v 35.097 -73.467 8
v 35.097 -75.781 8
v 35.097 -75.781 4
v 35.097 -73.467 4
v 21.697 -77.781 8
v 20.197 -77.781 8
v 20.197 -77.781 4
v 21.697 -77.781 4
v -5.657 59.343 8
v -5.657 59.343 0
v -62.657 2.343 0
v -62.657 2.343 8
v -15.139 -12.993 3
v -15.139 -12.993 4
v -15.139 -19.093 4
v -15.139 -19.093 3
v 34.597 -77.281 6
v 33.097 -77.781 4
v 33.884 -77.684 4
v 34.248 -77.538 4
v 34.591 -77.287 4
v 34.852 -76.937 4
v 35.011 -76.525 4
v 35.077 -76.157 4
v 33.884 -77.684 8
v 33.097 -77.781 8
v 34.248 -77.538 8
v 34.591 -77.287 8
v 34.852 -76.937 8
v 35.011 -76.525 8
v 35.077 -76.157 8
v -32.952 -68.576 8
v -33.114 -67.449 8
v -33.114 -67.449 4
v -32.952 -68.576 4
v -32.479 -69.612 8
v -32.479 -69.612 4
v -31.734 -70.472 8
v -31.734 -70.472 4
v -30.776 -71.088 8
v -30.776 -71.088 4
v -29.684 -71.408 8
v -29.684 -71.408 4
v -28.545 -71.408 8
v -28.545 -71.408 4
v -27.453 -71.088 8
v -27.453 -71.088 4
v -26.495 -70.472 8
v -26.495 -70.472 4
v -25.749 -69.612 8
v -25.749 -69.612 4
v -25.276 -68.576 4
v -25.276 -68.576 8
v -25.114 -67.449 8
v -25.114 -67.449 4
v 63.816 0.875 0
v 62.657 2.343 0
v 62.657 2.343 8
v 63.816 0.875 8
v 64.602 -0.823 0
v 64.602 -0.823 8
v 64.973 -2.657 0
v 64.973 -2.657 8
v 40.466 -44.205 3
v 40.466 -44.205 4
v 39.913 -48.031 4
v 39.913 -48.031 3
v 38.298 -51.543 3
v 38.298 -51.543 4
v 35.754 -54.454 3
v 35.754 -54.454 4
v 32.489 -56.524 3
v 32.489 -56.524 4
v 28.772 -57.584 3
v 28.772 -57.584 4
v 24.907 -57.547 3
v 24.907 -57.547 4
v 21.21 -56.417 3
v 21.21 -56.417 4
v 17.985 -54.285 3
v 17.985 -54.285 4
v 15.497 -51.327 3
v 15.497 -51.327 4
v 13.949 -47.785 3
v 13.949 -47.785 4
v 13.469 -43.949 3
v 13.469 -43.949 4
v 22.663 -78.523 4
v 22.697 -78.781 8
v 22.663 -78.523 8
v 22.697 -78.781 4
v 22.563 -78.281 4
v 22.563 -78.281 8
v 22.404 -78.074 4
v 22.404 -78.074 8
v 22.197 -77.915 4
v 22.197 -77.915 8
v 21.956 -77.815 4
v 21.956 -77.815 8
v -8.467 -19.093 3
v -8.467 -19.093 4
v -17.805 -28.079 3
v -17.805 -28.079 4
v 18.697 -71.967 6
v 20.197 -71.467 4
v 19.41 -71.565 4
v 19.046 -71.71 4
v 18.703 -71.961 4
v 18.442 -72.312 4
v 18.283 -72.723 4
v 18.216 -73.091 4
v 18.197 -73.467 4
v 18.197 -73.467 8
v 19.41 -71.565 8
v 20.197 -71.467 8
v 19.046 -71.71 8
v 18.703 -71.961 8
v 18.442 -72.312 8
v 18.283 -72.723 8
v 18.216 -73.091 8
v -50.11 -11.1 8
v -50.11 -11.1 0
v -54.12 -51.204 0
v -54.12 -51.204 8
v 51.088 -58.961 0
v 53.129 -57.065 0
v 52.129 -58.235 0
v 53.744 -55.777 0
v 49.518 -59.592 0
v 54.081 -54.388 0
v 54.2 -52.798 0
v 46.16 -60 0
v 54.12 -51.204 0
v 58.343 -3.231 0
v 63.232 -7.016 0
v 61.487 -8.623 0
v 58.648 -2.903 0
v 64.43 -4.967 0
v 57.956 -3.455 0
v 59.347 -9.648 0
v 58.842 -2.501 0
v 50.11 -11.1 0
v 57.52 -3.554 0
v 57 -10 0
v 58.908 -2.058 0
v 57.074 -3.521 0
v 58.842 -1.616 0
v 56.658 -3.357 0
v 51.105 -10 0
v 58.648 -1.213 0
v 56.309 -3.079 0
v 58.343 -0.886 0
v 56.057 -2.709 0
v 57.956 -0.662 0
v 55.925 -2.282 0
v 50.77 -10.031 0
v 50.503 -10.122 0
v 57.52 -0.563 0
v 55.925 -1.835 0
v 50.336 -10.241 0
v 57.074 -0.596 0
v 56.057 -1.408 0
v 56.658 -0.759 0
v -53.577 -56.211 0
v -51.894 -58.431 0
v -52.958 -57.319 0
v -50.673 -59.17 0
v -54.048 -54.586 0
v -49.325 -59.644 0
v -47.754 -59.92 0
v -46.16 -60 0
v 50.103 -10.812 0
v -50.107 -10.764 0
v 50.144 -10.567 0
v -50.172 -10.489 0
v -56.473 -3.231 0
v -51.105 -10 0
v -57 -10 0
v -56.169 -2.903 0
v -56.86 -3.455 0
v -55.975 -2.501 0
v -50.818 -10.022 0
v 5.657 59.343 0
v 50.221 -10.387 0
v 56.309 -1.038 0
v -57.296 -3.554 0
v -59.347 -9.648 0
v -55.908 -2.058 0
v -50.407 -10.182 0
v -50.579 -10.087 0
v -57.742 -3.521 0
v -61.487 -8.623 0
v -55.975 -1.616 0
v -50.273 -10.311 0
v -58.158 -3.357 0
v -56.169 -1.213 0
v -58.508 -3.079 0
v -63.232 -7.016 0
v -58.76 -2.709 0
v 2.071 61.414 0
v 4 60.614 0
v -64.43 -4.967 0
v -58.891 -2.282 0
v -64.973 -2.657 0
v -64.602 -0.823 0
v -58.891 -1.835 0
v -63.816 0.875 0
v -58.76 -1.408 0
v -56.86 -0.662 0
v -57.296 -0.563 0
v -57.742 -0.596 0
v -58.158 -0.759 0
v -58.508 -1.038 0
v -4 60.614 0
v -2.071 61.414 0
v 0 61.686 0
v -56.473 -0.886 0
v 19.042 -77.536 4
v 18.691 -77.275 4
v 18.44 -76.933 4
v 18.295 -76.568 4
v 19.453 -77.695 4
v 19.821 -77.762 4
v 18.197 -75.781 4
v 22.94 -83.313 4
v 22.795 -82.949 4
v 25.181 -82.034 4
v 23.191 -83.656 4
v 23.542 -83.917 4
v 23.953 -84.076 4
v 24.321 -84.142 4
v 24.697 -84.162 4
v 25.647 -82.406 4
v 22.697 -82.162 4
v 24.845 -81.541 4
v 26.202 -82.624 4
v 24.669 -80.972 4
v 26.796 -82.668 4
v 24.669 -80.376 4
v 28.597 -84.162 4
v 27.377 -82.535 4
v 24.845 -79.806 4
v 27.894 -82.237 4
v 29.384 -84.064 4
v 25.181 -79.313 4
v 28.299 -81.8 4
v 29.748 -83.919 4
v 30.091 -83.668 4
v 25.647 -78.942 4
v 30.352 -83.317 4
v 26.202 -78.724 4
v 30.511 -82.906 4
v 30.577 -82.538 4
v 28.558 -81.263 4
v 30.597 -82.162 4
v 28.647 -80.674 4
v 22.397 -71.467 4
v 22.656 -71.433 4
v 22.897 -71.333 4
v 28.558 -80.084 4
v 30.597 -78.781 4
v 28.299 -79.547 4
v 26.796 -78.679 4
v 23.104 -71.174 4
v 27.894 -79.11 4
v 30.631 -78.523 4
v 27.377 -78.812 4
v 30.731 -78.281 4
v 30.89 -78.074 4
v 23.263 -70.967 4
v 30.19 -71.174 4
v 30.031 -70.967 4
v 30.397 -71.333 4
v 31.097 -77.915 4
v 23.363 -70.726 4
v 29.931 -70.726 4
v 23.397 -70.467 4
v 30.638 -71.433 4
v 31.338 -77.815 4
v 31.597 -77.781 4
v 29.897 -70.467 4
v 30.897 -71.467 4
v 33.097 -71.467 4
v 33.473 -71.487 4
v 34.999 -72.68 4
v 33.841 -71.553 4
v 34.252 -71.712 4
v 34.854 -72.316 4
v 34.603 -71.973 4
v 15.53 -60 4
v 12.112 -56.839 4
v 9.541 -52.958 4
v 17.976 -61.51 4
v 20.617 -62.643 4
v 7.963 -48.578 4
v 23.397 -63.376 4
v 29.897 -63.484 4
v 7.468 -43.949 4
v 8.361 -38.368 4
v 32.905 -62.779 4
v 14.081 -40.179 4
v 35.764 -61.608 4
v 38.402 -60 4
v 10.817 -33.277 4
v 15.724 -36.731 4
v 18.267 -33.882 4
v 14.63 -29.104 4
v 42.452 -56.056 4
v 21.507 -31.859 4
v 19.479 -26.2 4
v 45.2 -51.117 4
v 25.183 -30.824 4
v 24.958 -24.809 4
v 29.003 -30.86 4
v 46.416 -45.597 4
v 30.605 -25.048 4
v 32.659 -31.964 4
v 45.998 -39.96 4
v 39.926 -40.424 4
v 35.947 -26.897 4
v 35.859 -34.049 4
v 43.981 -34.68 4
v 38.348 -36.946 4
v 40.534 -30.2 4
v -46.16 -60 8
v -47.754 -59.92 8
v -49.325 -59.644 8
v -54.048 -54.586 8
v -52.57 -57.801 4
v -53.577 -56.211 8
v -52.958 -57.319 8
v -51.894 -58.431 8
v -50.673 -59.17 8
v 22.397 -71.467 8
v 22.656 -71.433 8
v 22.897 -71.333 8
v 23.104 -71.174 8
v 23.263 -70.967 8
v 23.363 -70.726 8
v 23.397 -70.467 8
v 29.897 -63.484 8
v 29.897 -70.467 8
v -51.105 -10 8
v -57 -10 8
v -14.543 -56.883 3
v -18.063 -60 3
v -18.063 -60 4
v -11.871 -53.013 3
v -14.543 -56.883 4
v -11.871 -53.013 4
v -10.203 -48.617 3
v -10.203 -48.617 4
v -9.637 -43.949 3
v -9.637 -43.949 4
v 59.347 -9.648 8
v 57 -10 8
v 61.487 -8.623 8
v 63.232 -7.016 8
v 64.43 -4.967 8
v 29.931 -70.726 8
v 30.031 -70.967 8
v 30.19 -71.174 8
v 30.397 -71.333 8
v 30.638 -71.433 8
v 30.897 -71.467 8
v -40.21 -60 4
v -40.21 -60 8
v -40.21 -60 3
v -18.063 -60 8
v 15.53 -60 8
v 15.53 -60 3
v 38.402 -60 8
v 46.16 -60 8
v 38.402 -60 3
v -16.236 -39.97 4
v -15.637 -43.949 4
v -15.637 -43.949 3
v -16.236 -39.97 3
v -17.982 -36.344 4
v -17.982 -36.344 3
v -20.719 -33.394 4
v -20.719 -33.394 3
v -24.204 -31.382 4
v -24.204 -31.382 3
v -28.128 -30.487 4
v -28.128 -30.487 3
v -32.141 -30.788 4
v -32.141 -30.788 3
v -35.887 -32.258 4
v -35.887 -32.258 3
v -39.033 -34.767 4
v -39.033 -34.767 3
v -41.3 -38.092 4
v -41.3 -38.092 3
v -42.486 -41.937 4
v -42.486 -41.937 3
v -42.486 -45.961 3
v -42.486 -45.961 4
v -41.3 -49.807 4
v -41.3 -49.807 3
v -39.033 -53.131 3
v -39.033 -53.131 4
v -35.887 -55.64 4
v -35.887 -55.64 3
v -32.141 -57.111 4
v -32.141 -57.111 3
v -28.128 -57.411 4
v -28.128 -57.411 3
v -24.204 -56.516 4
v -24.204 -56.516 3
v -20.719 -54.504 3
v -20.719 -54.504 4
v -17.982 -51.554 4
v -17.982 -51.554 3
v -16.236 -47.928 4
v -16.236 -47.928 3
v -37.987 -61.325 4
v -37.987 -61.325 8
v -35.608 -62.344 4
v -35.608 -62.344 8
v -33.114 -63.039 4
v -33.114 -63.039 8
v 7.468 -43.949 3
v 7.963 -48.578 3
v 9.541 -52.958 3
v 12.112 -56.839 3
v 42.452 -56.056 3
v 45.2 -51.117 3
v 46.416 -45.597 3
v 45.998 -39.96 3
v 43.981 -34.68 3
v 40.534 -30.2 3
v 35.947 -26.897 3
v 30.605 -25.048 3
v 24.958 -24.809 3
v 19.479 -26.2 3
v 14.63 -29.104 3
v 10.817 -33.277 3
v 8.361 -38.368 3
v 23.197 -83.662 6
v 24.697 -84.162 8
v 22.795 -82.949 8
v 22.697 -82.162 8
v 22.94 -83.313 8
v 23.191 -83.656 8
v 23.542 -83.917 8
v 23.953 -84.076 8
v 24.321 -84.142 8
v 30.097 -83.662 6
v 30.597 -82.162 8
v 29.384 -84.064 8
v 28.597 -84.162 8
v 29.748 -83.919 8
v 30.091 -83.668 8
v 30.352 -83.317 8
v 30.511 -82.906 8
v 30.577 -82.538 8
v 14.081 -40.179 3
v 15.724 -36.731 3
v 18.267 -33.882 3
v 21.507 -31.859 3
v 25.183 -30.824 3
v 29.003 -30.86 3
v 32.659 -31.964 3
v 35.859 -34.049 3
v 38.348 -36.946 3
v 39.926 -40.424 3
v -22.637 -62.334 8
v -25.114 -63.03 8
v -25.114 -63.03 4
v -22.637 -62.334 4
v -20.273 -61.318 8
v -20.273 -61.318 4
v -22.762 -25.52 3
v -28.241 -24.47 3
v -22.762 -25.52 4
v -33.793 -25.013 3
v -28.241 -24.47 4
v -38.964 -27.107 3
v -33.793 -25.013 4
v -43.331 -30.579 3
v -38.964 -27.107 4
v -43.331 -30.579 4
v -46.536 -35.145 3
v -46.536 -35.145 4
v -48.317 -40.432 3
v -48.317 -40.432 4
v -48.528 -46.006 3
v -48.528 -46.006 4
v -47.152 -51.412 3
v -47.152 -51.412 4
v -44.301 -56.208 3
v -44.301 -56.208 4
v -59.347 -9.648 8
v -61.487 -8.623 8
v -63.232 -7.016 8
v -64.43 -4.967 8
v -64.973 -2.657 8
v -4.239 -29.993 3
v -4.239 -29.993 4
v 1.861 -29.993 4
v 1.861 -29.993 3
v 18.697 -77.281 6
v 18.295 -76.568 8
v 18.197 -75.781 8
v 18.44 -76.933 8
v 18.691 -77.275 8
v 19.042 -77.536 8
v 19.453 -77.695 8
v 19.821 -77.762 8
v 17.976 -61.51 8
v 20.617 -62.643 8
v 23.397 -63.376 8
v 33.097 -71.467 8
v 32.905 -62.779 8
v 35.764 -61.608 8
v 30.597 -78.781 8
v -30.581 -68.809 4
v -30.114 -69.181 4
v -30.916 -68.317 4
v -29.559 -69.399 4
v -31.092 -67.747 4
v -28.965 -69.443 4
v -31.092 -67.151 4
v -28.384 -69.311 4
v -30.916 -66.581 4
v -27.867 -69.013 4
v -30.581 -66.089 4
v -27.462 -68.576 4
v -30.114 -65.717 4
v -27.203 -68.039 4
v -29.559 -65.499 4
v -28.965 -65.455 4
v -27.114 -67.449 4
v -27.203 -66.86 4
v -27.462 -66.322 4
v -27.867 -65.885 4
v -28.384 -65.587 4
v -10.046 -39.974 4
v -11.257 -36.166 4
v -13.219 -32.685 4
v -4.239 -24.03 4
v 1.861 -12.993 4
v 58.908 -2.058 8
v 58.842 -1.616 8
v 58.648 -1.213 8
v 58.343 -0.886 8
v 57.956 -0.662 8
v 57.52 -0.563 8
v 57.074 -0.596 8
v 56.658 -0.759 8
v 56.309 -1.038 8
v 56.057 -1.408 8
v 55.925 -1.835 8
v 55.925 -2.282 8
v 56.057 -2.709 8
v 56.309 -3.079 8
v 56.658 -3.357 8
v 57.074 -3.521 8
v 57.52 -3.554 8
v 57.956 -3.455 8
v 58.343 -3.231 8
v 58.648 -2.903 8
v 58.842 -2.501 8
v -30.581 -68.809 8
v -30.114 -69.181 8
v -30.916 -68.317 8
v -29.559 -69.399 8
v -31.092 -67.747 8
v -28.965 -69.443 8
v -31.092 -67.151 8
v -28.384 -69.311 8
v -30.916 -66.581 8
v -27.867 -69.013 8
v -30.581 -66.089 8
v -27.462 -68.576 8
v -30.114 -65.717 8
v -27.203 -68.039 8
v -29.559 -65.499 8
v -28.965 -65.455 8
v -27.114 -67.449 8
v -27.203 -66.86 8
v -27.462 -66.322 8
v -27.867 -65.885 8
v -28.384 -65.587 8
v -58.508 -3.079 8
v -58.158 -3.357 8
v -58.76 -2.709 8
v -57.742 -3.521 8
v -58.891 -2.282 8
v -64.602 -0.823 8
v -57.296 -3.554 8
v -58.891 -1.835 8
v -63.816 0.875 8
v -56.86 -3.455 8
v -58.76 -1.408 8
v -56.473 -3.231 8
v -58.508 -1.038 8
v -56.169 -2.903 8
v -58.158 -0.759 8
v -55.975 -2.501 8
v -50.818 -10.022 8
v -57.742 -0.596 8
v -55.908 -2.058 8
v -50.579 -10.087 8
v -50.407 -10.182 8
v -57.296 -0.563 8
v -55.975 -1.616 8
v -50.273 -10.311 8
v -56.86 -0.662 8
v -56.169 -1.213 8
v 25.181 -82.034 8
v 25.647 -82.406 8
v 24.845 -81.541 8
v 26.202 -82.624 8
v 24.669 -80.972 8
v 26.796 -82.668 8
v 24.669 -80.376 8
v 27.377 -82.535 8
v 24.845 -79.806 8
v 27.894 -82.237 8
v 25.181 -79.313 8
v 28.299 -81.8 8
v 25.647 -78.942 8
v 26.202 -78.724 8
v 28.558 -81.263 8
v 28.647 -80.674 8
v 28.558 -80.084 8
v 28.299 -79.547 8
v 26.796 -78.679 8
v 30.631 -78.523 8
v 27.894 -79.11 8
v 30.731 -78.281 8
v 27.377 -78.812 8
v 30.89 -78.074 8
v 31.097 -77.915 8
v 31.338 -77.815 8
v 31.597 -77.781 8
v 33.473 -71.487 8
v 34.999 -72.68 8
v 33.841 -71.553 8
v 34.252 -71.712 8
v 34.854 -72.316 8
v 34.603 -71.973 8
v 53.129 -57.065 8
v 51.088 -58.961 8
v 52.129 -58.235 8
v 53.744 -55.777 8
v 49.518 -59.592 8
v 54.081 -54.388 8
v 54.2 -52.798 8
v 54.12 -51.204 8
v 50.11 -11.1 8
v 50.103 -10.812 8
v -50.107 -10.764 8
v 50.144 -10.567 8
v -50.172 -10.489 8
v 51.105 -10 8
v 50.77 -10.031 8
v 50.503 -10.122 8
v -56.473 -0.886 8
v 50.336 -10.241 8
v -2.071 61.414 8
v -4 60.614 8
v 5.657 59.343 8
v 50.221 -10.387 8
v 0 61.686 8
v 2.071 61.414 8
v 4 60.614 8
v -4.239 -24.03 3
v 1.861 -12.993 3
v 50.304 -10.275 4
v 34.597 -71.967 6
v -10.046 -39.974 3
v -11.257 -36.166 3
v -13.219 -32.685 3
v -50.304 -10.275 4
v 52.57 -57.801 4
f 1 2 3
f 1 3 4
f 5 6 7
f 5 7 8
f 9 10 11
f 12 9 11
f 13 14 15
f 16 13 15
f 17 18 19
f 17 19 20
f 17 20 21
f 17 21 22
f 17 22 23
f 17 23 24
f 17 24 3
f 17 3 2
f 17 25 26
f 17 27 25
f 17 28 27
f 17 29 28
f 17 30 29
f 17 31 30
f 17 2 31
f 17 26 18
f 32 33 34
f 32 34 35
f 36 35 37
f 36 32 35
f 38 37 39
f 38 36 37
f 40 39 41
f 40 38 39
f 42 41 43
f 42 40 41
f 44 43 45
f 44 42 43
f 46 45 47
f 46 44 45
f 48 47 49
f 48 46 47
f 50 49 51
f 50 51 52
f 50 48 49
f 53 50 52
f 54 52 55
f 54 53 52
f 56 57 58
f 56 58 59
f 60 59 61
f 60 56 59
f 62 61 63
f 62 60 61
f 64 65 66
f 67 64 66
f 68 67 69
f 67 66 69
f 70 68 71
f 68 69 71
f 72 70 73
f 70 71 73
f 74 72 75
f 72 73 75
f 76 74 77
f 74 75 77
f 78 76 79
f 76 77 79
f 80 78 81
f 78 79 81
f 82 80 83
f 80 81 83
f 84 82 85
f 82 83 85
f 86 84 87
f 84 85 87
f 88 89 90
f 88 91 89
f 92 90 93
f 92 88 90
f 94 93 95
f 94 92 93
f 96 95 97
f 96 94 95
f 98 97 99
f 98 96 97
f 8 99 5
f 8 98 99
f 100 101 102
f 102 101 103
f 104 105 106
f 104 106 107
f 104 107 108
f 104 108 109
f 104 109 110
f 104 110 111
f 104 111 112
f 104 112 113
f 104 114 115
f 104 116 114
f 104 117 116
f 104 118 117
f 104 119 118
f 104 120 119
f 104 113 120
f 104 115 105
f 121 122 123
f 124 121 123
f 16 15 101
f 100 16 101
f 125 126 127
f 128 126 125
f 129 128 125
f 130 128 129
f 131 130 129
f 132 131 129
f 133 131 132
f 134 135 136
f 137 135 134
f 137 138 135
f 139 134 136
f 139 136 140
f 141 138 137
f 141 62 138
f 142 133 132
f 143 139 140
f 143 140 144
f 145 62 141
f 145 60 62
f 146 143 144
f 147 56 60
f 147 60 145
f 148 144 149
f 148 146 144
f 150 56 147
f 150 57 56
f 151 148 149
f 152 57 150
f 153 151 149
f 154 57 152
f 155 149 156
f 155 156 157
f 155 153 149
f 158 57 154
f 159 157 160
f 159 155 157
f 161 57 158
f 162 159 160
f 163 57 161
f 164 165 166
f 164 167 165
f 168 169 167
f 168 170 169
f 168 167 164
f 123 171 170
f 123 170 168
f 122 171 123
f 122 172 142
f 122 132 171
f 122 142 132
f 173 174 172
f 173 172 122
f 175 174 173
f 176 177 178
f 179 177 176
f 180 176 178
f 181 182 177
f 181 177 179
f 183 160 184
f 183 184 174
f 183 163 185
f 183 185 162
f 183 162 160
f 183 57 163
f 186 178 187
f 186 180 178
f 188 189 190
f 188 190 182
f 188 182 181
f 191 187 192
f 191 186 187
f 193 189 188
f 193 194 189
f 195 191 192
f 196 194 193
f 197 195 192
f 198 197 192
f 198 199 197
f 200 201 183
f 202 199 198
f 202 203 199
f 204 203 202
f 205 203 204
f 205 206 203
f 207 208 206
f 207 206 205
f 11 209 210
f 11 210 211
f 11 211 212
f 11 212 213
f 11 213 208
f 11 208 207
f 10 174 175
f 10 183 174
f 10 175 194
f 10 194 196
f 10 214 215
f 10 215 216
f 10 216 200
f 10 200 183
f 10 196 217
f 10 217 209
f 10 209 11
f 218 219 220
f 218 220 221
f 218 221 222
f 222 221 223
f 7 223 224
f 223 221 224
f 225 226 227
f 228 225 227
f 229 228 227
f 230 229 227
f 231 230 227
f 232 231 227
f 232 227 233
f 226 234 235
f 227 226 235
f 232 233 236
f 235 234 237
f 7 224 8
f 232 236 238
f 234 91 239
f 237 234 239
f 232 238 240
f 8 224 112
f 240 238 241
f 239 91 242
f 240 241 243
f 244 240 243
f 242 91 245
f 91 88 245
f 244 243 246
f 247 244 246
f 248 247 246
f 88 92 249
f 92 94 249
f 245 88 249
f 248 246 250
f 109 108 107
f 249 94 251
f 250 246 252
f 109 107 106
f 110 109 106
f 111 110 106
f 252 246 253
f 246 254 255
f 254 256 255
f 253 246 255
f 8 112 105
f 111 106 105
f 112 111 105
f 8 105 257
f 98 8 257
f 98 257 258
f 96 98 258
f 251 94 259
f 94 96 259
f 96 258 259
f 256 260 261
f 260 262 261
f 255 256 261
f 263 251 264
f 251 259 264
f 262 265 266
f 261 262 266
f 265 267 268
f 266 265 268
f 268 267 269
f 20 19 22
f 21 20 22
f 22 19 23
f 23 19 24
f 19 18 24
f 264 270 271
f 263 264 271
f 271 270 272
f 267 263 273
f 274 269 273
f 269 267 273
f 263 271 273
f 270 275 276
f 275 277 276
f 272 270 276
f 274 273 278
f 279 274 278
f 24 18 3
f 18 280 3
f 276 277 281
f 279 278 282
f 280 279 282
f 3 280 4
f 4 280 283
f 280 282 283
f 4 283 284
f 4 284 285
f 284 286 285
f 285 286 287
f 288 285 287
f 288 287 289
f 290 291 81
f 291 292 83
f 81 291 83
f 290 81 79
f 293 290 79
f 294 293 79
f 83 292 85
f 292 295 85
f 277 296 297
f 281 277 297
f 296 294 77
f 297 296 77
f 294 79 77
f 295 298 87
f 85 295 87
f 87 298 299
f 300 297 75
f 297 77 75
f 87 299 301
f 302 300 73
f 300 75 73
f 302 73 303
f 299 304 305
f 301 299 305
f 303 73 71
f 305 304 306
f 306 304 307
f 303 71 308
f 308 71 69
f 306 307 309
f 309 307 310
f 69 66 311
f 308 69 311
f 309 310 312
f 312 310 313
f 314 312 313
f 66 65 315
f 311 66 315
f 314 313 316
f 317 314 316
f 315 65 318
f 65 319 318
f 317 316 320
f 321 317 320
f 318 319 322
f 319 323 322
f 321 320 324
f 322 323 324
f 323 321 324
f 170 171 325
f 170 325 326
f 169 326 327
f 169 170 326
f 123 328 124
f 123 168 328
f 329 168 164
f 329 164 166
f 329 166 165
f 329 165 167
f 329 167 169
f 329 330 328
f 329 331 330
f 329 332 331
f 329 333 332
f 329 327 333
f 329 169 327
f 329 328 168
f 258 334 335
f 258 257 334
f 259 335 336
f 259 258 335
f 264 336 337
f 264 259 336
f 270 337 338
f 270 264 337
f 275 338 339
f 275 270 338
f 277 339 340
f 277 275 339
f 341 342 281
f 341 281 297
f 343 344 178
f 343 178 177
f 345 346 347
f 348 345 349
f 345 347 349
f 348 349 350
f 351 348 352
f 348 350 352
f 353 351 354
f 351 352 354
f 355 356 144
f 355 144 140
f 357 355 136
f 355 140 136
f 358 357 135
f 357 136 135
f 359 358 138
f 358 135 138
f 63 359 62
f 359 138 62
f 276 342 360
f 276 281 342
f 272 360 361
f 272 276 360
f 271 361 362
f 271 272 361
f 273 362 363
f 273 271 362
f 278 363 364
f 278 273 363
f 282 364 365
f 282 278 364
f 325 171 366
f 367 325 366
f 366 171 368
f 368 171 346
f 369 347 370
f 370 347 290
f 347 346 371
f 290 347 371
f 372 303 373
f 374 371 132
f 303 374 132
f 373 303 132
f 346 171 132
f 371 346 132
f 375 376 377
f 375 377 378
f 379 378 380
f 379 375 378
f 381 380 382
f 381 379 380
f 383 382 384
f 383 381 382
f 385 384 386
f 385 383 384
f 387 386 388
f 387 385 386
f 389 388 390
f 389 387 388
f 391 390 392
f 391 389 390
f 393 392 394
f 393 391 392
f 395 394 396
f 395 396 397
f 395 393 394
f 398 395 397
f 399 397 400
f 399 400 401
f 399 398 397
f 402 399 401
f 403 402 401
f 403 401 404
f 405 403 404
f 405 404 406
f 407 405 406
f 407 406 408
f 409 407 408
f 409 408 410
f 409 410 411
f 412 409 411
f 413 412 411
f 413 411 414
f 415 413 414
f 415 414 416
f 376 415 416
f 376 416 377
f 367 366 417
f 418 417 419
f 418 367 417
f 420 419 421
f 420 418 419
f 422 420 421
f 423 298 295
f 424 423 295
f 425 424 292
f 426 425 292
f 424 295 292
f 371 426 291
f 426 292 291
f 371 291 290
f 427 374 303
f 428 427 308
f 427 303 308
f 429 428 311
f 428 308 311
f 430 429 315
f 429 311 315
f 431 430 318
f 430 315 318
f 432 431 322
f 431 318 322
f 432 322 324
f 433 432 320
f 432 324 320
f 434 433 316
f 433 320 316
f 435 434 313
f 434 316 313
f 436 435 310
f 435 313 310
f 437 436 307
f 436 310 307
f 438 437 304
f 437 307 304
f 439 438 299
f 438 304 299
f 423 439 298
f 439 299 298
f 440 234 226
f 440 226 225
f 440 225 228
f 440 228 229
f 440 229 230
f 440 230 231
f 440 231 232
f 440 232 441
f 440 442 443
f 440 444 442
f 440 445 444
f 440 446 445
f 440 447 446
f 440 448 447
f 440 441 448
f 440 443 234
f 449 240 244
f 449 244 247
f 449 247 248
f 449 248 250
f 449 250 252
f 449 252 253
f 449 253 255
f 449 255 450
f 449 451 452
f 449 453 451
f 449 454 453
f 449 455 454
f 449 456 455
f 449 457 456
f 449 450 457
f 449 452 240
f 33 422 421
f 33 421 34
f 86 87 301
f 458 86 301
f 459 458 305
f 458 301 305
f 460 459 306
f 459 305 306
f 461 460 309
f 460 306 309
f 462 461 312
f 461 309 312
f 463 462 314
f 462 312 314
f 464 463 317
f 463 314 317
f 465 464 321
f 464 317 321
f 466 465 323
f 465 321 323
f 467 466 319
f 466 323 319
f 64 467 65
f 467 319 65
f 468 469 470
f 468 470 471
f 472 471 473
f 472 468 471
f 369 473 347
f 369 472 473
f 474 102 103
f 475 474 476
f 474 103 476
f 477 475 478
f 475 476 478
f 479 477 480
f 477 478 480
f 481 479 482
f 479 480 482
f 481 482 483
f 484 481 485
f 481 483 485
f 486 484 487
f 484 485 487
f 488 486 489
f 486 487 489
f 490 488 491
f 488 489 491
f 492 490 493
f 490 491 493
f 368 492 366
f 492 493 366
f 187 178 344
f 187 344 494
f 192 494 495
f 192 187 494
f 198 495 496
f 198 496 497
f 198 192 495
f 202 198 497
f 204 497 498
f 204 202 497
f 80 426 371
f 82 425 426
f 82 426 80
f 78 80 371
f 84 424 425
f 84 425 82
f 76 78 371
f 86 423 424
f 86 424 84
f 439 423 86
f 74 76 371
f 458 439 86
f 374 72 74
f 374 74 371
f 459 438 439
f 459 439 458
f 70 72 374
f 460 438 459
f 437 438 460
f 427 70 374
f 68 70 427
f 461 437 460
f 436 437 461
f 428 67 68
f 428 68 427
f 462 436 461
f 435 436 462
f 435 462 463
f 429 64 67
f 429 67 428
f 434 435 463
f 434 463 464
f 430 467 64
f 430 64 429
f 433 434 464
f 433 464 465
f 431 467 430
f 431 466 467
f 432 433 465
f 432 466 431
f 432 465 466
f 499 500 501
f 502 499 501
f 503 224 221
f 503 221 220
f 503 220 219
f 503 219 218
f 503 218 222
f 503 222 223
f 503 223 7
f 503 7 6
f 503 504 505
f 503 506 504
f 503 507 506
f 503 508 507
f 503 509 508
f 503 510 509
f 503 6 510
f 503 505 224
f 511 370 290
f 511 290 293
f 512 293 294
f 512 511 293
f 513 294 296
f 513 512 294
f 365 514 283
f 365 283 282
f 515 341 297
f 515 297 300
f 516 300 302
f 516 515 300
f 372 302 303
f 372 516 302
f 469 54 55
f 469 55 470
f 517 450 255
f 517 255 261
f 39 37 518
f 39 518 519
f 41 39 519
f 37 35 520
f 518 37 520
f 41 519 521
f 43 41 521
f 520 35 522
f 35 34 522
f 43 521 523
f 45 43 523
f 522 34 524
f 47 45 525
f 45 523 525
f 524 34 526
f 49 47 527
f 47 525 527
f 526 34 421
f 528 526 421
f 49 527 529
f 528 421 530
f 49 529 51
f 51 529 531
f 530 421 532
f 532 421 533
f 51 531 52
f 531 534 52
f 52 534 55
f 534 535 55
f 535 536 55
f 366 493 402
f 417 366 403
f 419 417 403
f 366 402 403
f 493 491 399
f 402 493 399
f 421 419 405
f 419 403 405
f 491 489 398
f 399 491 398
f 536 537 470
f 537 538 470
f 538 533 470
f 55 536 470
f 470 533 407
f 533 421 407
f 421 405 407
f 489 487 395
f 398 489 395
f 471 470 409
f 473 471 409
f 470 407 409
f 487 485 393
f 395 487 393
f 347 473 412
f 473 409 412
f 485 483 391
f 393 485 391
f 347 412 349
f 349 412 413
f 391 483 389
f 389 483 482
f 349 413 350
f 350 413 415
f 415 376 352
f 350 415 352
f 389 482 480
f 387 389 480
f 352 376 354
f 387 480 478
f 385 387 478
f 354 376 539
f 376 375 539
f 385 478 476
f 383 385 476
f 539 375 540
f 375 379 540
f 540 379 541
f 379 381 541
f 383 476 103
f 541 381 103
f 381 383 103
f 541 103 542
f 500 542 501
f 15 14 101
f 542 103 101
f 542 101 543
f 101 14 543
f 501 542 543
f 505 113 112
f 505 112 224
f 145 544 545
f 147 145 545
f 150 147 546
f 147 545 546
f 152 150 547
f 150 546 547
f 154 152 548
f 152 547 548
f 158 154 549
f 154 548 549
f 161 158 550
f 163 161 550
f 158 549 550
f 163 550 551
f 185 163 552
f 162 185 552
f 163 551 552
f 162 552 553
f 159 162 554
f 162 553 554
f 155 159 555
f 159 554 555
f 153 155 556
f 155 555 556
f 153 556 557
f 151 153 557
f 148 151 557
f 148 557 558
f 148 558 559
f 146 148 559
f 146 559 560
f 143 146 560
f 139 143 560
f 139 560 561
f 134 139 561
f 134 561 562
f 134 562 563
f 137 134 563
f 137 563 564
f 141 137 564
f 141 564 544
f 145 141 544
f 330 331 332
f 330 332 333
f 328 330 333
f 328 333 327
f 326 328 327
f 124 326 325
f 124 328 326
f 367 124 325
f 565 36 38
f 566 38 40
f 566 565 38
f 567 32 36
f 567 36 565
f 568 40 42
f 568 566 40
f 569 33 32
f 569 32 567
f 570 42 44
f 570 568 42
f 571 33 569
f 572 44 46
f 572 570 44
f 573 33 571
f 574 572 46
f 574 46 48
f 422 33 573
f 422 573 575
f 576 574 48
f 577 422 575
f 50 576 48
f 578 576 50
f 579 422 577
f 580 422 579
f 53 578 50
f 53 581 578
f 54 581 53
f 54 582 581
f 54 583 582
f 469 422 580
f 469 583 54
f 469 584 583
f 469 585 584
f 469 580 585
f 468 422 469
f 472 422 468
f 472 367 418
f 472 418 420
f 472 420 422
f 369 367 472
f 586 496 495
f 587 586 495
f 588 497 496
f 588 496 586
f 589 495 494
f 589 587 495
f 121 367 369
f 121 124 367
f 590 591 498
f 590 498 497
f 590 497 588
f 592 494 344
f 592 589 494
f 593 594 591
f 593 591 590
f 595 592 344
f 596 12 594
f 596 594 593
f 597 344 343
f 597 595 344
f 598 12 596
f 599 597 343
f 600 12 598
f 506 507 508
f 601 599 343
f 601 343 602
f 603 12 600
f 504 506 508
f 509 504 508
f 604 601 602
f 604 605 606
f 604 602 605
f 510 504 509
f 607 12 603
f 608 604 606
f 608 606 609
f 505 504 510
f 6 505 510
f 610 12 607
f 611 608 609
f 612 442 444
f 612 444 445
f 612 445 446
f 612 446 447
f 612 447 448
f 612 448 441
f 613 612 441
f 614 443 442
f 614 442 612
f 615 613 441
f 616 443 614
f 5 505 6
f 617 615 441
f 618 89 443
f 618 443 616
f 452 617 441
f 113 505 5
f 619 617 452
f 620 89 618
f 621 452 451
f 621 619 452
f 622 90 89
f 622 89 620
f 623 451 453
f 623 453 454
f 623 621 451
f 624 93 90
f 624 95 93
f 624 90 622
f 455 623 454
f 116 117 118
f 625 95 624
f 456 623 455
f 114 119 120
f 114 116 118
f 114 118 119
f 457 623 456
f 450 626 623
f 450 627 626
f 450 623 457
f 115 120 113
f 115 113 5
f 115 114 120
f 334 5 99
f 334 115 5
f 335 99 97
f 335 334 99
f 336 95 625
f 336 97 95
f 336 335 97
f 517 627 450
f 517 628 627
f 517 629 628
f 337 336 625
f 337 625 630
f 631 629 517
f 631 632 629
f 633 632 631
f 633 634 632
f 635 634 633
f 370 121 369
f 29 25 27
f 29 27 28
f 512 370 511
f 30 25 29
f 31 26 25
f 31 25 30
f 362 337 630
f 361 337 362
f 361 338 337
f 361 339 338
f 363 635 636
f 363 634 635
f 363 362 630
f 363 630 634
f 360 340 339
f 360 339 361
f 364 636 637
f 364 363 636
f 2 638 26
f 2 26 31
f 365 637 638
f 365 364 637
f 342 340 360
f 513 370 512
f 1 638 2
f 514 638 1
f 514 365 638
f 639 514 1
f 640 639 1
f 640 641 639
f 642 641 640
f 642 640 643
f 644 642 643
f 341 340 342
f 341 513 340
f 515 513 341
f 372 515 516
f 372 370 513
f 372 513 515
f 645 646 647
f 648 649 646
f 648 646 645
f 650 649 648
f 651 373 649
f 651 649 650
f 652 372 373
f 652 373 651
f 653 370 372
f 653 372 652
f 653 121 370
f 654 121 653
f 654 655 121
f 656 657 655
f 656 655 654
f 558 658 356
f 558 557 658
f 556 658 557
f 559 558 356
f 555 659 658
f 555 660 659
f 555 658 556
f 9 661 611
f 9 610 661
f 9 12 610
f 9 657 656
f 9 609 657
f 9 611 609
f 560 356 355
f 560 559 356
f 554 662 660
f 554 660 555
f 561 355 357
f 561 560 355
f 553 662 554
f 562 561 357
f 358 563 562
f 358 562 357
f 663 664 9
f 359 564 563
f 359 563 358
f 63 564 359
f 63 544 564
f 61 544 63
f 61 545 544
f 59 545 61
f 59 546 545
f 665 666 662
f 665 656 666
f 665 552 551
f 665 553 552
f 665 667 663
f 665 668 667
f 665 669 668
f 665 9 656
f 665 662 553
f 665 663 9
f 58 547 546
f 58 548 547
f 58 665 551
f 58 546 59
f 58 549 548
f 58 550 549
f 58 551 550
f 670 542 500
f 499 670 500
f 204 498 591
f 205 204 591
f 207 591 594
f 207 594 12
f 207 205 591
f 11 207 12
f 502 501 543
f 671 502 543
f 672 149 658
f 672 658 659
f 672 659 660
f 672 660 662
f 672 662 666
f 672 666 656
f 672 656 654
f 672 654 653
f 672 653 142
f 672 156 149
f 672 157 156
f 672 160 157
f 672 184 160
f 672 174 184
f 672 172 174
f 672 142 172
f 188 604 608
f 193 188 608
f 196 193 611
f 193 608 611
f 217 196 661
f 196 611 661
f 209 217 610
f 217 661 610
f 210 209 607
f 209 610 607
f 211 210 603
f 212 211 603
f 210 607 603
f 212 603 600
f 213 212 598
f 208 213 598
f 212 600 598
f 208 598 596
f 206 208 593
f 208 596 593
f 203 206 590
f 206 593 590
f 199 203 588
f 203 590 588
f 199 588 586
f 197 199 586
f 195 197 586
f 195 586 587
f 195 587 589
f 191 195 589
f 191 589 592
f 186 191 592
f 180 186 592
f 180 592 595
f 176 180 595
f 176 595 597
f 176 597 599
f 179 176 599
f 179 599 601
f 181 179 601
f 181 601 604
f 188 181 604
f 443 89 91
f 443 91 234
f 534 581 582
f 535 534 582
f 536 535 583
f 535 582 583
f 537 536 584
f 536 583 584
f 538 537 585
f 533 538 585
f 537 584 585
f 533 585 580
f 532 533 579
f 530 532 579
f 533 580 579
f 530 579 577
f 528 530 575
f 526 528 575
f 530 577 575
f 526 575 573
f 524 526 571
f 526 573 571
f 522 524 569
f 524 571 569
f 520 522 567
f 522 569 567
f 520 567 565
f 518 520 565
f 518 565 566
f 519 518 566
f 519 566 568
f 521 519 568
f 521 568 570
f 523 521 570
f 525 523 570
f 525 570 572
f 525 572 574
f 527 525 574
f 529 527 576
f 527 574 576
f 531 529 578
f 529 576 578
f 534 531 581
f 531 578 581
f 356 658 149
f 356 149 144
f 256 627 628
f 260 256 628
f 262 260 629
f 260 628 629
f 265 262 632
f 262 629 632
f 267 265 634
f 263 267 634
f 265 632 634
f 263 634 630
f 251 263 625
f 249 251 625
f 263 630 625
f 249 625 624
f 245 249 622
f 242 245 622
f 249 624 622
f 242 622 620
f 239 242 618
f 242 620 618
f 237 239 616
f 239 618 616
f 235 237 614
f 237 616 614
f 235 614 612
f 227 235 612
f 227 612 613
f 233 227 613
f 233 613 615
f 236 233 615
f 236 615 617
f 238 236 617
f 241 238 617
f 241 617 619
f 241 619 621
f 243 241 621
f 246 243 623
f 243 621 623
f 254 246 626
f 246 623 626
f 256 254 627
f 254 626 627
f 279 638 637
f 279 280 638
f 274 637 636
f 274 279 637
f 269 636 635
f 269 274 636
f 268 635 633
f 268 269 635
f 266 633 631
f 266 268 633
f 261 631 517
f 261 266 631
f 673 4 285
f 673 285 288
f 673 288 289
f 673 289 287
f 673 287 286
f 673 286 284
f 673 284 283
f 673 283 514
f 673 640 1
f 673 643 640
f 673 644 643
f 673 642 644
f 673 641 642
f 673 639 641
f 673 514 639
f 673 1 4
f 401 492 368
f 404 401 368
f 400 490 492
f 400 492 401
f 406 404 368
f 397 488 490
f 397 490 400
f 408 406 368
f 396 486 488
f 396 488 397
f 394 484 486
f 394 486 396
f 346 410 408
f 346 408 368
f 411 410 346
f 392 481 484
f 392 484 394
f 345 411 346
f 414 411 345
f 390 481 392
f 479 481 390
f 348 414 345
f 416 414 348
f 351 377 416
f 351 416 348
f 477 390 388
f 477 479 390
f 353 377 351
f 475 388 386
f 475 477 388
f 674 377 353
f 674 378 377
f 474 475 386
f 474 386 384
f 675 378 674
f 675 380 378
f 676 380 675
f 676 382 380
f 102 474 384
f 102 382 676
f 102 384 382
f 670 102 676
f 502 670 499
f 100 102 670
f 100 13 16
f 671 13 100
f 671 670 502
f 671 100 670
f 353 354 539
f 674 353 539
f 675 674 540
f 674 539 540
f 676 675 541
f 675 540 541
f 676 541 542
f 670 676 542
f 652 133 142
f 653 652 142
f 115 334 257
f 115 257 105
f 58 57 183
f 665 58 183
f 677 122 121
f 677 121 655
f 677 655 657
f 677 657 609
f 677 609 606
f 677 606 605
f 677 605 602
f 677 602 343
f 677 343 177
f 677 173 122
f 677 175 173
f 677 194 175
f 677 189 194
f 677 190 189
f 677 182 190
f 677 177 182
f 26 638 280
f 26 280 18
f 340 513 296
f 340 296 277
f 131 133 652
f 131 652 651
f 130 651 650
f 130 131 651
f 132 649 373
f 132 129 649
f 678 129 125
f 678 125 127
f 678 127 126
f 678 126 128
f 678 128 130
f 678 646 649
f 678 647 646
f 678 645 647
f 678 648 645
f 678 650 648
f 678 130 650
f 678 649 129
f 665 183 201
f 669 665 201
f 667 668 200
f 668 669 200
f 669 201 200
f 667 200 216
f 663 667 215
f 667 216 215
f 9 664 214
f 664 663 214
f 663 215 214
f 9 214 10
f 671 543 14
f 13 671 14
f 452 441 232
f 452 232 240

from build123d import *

# Parameters (mm, degrees)
F1_DEPTH    = 8
F2_T1_DEPTH = 24.5685424949
F2_T3_DEPTH = 48
F3_T1_DEPTH = 8
F4_T1_DEPTH = 52.1995024845
F5_R        = 13.5
F5_R_2      = 2
F6_DEPTH    = 5
F7_DEPTH    = 4
F8_T1_DEPTH = 14
F9_R        = 1
F10_R       = 1.5
F11_DEPTH   = 25


# Not quite as in the source:
# - a fillet or chamfer that OpenCascade refuses, or shapes differently, is made with other operations: its cross-section is extruded or revolved along the edge and cut away or added


with BuildPart() as f1:
    # F0 (on Top) → F1 (new body)
    with BuildSketch(Plane.XY):
        Polygon((65, 0), (0, 65), (-65, 0), (-65, -10), (-50, -10), (-55, -60), (0, -60), (55, -60), (50, -10), (65, -10), align=None)
    extrude(amount=F1_DEPTH)

    # F2: fillet of radius 8 on 5 edges, made by hand

    # F2_s2 → F2_t1 (cut)
    with BuildSketch(Plane.XY.offset(-8.2842712475)):
        with BuildLine():
            ThreePointArc((-65, -3.313708499), (-64.3910362601, -0.2522410401), (-62.6568542495, 2.3431457505))
            Line((-62.6568542495, 2.3431457505), (-65, 0))
            Line((-65, 0), (-65, -3.313708499))
        make_face()
        with BuildLine():
            ThreePointArc((62.6568542495, 2.3431457505), (64.3910362601, -0.2522410401), (65, -3.313708499))
            Line((65, -3.313708499), (65, 0))
            Line((65, 0), (62.6568542495, 2.3431457505))
        make_face()
    extrude(amount=F2_T1_DEPTH, mode=Mode.SUBTRACT)

    # F2_s4 → F2_t3 (cut)
    with BuildSketch(Plane.XY.offset(-20)):
        with BuildLine():
            ThreePointArc((5.6568542495, 59.3431457505), (0, 61.686291501), (-5.6568542495, 59.3431457505))
            Line((-5.6568542495, 59.3431457505), (0, 65))
            Line((0, 65), (5.6568542495, 59.3431457505))
        make_face()
        with BuildLine():
            ThreePointArc((57, -10), (62.6568542495, -7.6568542495), (65, -2))
            Line((65, -2), (65, -10))
            Line((65, -10), (57, -10))
        make_face()
        with BuildLine():
            ThreePointArc((-57, -10), (-62.6568542495, -7.6568542495), (-65, -2))
            Line((-65, -2), (-65, -10))
            Line((-65, -10), (-57, -10))
        make_face()
    extrude(amount=F2_T3_DEPTH, mode=Mode.SUBTRACT)

    # F3: fillet of radius 1 on 2 edges, made by hand

    # F3_s2 → F3_t1 (join)
    with BuildSketch(Plane.XY):
        with BuildLine():
            add(Edge.make_bspline(
                [(51.1049875621, -10), (50, -10), (50.1099503719, -11.099503719)],
                knots=[0, 0, 0, 1, 1, 1], degree=2, weights=[1, 1, 1]))
            Line((50.1099503719, -11.099503719), (50, -10))
            Line((50, -10), (51.1049875621, -10))
        make_face()
        with BuildLine():
            add(Edge.make_bspline(
                [(-50.1099503719, -11.099503719), (-50, -10), (-51.1049875621, -10)],
                knots=[0, 0, 0, 1, 1, 1], degree=2, weights=[1, 1, 1]))
            Line((-51.1049875621, -10), (-50, -10))
            Line((-50, -10), (-50.1099503719, -11.099503719))
        make_face()
    extrude(amount=F3_T1_DEPTH)

    # F4: fillet of radius 8 on 2 edges, made by hand

    # F4_s2 → F4_t1 (cut)
    with BuildSketch(Plane.XY.offset(-22.0997512422)):
        with BuildLine():
            add(Edge.make_bspline(
                [(-46.1600995031, -60), (-55, -60), (-54.1203970248, -51.2039702478)],
                knots=[0, 0, 0, 1, 1, 1], degree=2, weights=[1, 1, 1]))
            Line((-54.1203970248, -51.2039702478), (-55, -60))
            Line((-55, -60), (-46.1600995031, -60))
        make_face()
        with BuildLine():
            add(Edge.make_bspline(
                [(54.1203970248, -51.2039702478), (55, -60), (46.1600995031, -60)],
                knots=[0, 0, 0, 1, 1, 1], degree=2, weights=[1, 1, 1]))
            Line((46.1600995031, -60), (55, -60))
            Line((55, -60), (54.1203970248, -51.2039702478))
        make_face()
    extrude(amount=F4_T1_DEPTH, mode=Mode.SUBTRACT)

    # F5 (on face) → F6 (cut)
    with BuildSketch(Plane.XY.offset(8)):
        with BuildLine():
            Line((-8.4674237296, -19.0932191908), (-17.8053588669, -28.0791480434))
            ThreePointArc((-17.8053588669, -28.0791480434), (-45.0974523982, -32.7464944514), (-40.2098223871, -60))
            Line((-40.2098223871, -60), (-18.0631891992, -60))
            ThreePointArc((-18.0631891992, -60), (-11.8712274348, -53.0133159845), (-9.6365057932, -43.9490916266))
            ThreePointArc((-9.6365057932, -43.9490916266), (-10.5536669898, -38.0390914567), (-13.2188752299, -32.6850320897))
            Line((-13.2188752299, -32.6850320897), (-4.2390260021, -24.0298833133))
            Line((-4.2390260021, -24.0298833133), (-4.2390260021, -29.9932191908))
            Line((-4.2390260021, -29.9932191908), (1.8609739979, -29.9932191908))
            Line((1.8609739979, -29.9932191908), (1.8609739979, -12.9932191908))
            Line((1.8609739979, -12.9932191908), (-15.1390260021, -12.9932191908))
            Line((-15.1390260021, -12.9932191908), (-15.1390260021, -19.0932191908))
            Line((-15.1390260021, -19.0932191908), (-8.4674237296, -19.0932191908))
        make_face()
        with Locations((-29.1365057932, -43.9490916266)):
            Circle(F5_R, mode=Mode.SUBTRACT)
        with BuildLine():
            Line((-18.0631891992, -60), (-40.2098223871, -60))
            ThreePointArc((-40.2098223871, -60), (-36.8140065496, -61.8741015885), (-33.1144459271, -63.039036422))
            Line((-33.1144459271, -63.039036422), (-33.1144459271, -67.4490812726))
            ThreePointArc((-33.1144459271, -67.4490812726), (-29.1144459271, -71.4490812726), (-25.1144459271, -67.4490812726))
            Line((-25.1144459271, -67.4490812726), (-25.1144459271, -63.0297895812))
            ThreePointArc((-25.1144459271, -63.0297895812), (-21.4382914649, -61.8652155421), (-18.0631891992, -60))
        make_face()
        with Locations((-29.1144459271, -67.4490812726)):
            Circle(F5_R_2, mode=Mode.SUBTRACT)
        with BuildLine():
            Line((38.4021761528, -60), (15.5300545524, -60))
            ThreePointArc((15.5300545524, -60), (19.2758562864, -62.1250310842), (23.3967523072, -63.3760321733))
            Line((23.3967523072, -63.3760321733), (23.3967523072, -71.4671202268))
            Line((23.3967523072, -71.4671202268), (18.1967523072, -71.4671202268))
            Line((18.1967523072, -71.4671202268), (18.1967523072, -77.7814015746))
            Line((18.1967523072, -77.7814015746), (22.6967523072, -77.7814015746))
            Line((22.6967523072, -77.7814015746), (22.6967523072, -84.1620080173))
            Line((22.6967523072, -84.1620080173), (30.5967523072, -84.1620080173))
            Line((30.5967523072, -84.1620080173), (30.5967523072, -77.7814015746))
            Line((30.5967523072, -77.7814015746), (35.0967523072, -77.7814015746))
            Line((35.0967523072, -77.7814015746), (35.0967523072, -71.4671202268))
            Line((35.0967523072, -71.4671202268), (29.8967523072, -71.4671202268))
            Line((29.8967523072, -71.4671202268), (29.8967523072, -63.48401191))
            ThreePointArc((29.8967523072, -63.48401191), (34.357670388, -62.2502940054), (38.4021761528, -60))
        make_face()
        with Locations((26.6467523072, -80.6736797094)):
            Circle(F5_R_2, mode=Mode.SUBTRACT)
        with BuildLine():
            ThreePointArc((7.4678010834, -43.9490916266), (9.5407945482, -52.9581017828), (15.5300545524, -60))
            Line((15.5300545524, -60), (38.4021761528, -60))
            ThreePointArc((38.4021761528, -60), (35.9470895566, -26.8967619578), (7.4678010834, -43.9490916266))
        make_face()
        with BuildLine():
            ThreePointArc((40.4661153526, -44.2054910373), (26.8379098659, -57.7048822588), (13.4685504114, -43.9490916266))
            ThreePointArc((13.4685504114, -43.9490916266), (27.0943208393, -30.7060998157), (40.4661153526, -44.2054910373))
        make_face(mode=Mode.SUBTRACT)
    extrude(amount=-F6_DEPTH, mode=Mode.SUBTRACT)

    # F5 (on face) → F7 (join)
    with BuildSketch(Plane.XY.offset(8)):
        with BuildLine():
            Line((-8.4674237296, -19.0932191908), (-17.8053588669, -28.0791480434))
            ThreePointArc((-17.8053588669, -28.0791480434), (-46.9989205625, -36.1270625672), (-33.1144459271, -63.039036422))
            Line((-33.1144459271, -63.039036422), (-33.1144459271, -67.4490812726))
            ThreePointArc((-33.1144459271, -67.4490812726), (-29.1144459271, -71.4490812726), (-25.1144459271, -67.4490812726))
            Line((-25.1144459271, -67.4490812726), (-25.1144459271, -63.0297895812))
            ThreePointArc((-25.1144459271, -63.0297895812), (-13.99252733, -56.2336313537), (-9.6365057932, -43.9490916266))
            ThreePointArc((-9.6365057932, -43.9490916266), (-10.5536669898, -38.0390914567), (-13.2188752299, -32.6850320897))
            Line((-13.2188752299, -32.6850320897), (-4.2390260021, -24.0298833133))
            Line((-4.2390260021, -24.0298833133), (-4.2390260021, -29.9932191908))
            Line((-4.2390260021, -29.9932191908), (1.8609739979, -29.9932191908))
            Line((1.8609739979, -29.9932191908), (1.8609739979, -12.9932191908))
            Line((1.8609739979, -12.9932191908), (-15.1390260021, -12.9932191908))
            Line((-15.1390260021, -12.9932191908), (-15.1390260021, -19.0932191908))
            Line((-15.1390260021, -19.0932191908), (-8.4674237296, -19.0932191908))
        make_face()
        with Locations((-29.1144459271, -67.4490812726)):
            Circle(F5_R_2, mode=Mode.SUBTRACT)
        with Locations((-29.1365057932, -43.9490916266)):
            Circle(F5_R, mode=Mode.SUBTRACT)
        with BuildLine():
            ThreePointArc((29.8967523072, -63.48401191), (39.7733500471, -29.500908776), (7.4678010834, -43.9490916266))
            ThreePointArc((7.4678010834, -43.9490916266), (11.8869595763, -56.5695138889), (23.3967523072, -63.3760321733))
            Line((23.3967523072, -63.3760321733), (23.3967523072, -71.4671202268))
            Line((23.3967523072, -71.4671202268), (18.1967523072, -71.4671202268))
            Line((18.1967523072, -71.4671202268), (18.1967523072, -77.7814015746))
            Line((18.1967523072, -77.7814015746), (22.6967523072, -77.7814015746))
            Line((22.6967523072, -77.7814015746), (22.6967523072, -84.1620080173))
            Line((22.6967523072, -84.1620080173), (30.5967523072, -84.1620080173))
            Line((30.5967523072, -84.1620080173), (30.5967523072, -77.7814015746))
            Line((30.5967523072, -77.7814015746), (35.0967523072, -77.7814015746))
            Line((35.0967523072, -77.7814015746), (35.0967523072, -71.4671202268))
            Line((35.0967523072, -71.4671202268), (29.8967523072, -71.4671202268))
            Line((29.8967523072, -71.4671202268), (29.8967523072, -63.48401191))
        make_face()
        with Locations((26.6467523072, -80.6736797094)):
            Circle(F5_R_2, mode=Mode.SUBTRACT)
        with BuildLine():
            ThreePointArc((40.4661153526, -44.2054910373), (26.8379098659, -57.7048822588), (13.4685504114, -43.9490916266))
            ThreePointArc((13.4685504114, -43.9490916266), (27.0943208393, -30.7060998157), (40.4661153526, -44.2054910373))
        make_face(mode=Mode.SUBTRACT)
    extrude(amount=-F7_DEPTH)

    # F8: fillet of radius 2 on 6 edges, made by hand

    # F8_s2 → F8_t1 (cut)
    with BuildSketch(Plane.XY.offset(-1)):
        with BuildLine():
            add(Edge.make_bspline(
                [(30.5967523072, -82.1620080173), (30.5967523072, -84.1620080173), (28.5967523072, -84.1620080173)],
                knots=[0, 0, 0, 1, 1, 1], degree=2, weights=[1, 1, 1]))
            Line((28.5967523072, -84.1620080173), (30.5967523072, -84.1620080173))
            Line((30.5967523072, -84.1620080173), (30.5967523072, -82.1620080173))
        make_face()
        with BuildLine():
            add(Edge.make_bspline(
                [(24.6967523072, -84.1620080173), (22.6967523072, -84.1620080173), (22.6967523072, -82.1620080173)],
                knots=[0, 0, 0, 1, 1, 1], degree=2, weights=[1, 1, 1]))
            Line((22.6967523072, -82.1620080173), (22.6967523072, -84.1620080173))
            Line((22.6967523072, -84.1620080173), (24.6967523072, -84.1620080173))
        make_face()
        with BuildLine():
            add(Edge.make_bspline(
                [(20.1967523072, -77.7814015746), (18.1967523072, -77.7814015746), (18.1967523072, -75.7814015746)],
                knots=[0, 0, 0, 1, 1, 1], degree=2, weights=[1, 1, 1]))
            Line((18.1967523072, -75.7814015746), (18.1967523072, -77.7814015746))
            Line((18.1967523072, -77.7814015746), (20.1967523072, -77.7814015746))
        make_face()
        with BuildLine():
            add(Edge.make_bspline(
                [(35.0967523072, -75.7814015746), (35.0967523072, -77.7814015746), (33.0967523072, -77.7814015746)],
                knots=[0, 0, 0, 1, 1, 1], degree=2, weights=[1, 1, 1]))
            Line((33.0967523072, -77.7814015746), (35.0967523072, -77.7814015746))
            Line((35.0967523072, -77.7814015746), (35.0967523072, -75.7814015746))
        make_face()
        with BuildLine():
            add(Edge.make_bspline(
                [(33.0967523072, -71.4671202268), (35.0967523072, -71.4671202268), (35.0967523072, -73.4671202268)],
                knots=[0, 0, 0, 1, 1, 1], degree=2, weights=[1, 1, 1]))
            Line((35.0967523072, -73.4671202268), (35.0967523072, -71.4671202268))
            Line((35.0967523072, -71.4671202268), (33.0967523072, -71.4671202268))
        make_face()
        with BuildLine():
            add(Edge.make_bspline(
                [(18.1967523072, -73.4671202268), (18.1967523072, -71.4671202268), (20.1967523072, -71.4671202268)],
                knots=[0, 0, 0, 1, 1, 1], degree=2, weights=[1, 1, 1]))
            Line((20.1967523072, -71.4671202268), (18.1967523072, -71.4671202268))
            Line((18.1967523072, -71.4671202268), (18.1967523072, -73.4671202268))
        make_face()
    extrude(amount=F8_T1_DEPTH, mode=Mode.SUBTRACT)

    # F9
    f9_edges = [f1.edges().sort_by_distance(p)[0] for p in [
        (23.396752, -71.46712, 6),
        (29.896752, -71.46712, 6),
        (30.596752, -77.781402, 6),
        (22.696752, -77.781402, 6),
    ]]
    fillet(f9_edges, radius=F9_R)

    # F10 (on face) → F11 (cut)
    with BuildSketch(Plane.XY.offset(8)):
        with Locations((-57.4082396924, -2.0584366284)):
            Circle(F10_R)
        with Locations((57.4082396924, -2.0584366284)):
            Circle(F10_R)
    extrude(amount=-F11_DEPTH, mode=Mode.SUBTRACT)


solid = f1.part
